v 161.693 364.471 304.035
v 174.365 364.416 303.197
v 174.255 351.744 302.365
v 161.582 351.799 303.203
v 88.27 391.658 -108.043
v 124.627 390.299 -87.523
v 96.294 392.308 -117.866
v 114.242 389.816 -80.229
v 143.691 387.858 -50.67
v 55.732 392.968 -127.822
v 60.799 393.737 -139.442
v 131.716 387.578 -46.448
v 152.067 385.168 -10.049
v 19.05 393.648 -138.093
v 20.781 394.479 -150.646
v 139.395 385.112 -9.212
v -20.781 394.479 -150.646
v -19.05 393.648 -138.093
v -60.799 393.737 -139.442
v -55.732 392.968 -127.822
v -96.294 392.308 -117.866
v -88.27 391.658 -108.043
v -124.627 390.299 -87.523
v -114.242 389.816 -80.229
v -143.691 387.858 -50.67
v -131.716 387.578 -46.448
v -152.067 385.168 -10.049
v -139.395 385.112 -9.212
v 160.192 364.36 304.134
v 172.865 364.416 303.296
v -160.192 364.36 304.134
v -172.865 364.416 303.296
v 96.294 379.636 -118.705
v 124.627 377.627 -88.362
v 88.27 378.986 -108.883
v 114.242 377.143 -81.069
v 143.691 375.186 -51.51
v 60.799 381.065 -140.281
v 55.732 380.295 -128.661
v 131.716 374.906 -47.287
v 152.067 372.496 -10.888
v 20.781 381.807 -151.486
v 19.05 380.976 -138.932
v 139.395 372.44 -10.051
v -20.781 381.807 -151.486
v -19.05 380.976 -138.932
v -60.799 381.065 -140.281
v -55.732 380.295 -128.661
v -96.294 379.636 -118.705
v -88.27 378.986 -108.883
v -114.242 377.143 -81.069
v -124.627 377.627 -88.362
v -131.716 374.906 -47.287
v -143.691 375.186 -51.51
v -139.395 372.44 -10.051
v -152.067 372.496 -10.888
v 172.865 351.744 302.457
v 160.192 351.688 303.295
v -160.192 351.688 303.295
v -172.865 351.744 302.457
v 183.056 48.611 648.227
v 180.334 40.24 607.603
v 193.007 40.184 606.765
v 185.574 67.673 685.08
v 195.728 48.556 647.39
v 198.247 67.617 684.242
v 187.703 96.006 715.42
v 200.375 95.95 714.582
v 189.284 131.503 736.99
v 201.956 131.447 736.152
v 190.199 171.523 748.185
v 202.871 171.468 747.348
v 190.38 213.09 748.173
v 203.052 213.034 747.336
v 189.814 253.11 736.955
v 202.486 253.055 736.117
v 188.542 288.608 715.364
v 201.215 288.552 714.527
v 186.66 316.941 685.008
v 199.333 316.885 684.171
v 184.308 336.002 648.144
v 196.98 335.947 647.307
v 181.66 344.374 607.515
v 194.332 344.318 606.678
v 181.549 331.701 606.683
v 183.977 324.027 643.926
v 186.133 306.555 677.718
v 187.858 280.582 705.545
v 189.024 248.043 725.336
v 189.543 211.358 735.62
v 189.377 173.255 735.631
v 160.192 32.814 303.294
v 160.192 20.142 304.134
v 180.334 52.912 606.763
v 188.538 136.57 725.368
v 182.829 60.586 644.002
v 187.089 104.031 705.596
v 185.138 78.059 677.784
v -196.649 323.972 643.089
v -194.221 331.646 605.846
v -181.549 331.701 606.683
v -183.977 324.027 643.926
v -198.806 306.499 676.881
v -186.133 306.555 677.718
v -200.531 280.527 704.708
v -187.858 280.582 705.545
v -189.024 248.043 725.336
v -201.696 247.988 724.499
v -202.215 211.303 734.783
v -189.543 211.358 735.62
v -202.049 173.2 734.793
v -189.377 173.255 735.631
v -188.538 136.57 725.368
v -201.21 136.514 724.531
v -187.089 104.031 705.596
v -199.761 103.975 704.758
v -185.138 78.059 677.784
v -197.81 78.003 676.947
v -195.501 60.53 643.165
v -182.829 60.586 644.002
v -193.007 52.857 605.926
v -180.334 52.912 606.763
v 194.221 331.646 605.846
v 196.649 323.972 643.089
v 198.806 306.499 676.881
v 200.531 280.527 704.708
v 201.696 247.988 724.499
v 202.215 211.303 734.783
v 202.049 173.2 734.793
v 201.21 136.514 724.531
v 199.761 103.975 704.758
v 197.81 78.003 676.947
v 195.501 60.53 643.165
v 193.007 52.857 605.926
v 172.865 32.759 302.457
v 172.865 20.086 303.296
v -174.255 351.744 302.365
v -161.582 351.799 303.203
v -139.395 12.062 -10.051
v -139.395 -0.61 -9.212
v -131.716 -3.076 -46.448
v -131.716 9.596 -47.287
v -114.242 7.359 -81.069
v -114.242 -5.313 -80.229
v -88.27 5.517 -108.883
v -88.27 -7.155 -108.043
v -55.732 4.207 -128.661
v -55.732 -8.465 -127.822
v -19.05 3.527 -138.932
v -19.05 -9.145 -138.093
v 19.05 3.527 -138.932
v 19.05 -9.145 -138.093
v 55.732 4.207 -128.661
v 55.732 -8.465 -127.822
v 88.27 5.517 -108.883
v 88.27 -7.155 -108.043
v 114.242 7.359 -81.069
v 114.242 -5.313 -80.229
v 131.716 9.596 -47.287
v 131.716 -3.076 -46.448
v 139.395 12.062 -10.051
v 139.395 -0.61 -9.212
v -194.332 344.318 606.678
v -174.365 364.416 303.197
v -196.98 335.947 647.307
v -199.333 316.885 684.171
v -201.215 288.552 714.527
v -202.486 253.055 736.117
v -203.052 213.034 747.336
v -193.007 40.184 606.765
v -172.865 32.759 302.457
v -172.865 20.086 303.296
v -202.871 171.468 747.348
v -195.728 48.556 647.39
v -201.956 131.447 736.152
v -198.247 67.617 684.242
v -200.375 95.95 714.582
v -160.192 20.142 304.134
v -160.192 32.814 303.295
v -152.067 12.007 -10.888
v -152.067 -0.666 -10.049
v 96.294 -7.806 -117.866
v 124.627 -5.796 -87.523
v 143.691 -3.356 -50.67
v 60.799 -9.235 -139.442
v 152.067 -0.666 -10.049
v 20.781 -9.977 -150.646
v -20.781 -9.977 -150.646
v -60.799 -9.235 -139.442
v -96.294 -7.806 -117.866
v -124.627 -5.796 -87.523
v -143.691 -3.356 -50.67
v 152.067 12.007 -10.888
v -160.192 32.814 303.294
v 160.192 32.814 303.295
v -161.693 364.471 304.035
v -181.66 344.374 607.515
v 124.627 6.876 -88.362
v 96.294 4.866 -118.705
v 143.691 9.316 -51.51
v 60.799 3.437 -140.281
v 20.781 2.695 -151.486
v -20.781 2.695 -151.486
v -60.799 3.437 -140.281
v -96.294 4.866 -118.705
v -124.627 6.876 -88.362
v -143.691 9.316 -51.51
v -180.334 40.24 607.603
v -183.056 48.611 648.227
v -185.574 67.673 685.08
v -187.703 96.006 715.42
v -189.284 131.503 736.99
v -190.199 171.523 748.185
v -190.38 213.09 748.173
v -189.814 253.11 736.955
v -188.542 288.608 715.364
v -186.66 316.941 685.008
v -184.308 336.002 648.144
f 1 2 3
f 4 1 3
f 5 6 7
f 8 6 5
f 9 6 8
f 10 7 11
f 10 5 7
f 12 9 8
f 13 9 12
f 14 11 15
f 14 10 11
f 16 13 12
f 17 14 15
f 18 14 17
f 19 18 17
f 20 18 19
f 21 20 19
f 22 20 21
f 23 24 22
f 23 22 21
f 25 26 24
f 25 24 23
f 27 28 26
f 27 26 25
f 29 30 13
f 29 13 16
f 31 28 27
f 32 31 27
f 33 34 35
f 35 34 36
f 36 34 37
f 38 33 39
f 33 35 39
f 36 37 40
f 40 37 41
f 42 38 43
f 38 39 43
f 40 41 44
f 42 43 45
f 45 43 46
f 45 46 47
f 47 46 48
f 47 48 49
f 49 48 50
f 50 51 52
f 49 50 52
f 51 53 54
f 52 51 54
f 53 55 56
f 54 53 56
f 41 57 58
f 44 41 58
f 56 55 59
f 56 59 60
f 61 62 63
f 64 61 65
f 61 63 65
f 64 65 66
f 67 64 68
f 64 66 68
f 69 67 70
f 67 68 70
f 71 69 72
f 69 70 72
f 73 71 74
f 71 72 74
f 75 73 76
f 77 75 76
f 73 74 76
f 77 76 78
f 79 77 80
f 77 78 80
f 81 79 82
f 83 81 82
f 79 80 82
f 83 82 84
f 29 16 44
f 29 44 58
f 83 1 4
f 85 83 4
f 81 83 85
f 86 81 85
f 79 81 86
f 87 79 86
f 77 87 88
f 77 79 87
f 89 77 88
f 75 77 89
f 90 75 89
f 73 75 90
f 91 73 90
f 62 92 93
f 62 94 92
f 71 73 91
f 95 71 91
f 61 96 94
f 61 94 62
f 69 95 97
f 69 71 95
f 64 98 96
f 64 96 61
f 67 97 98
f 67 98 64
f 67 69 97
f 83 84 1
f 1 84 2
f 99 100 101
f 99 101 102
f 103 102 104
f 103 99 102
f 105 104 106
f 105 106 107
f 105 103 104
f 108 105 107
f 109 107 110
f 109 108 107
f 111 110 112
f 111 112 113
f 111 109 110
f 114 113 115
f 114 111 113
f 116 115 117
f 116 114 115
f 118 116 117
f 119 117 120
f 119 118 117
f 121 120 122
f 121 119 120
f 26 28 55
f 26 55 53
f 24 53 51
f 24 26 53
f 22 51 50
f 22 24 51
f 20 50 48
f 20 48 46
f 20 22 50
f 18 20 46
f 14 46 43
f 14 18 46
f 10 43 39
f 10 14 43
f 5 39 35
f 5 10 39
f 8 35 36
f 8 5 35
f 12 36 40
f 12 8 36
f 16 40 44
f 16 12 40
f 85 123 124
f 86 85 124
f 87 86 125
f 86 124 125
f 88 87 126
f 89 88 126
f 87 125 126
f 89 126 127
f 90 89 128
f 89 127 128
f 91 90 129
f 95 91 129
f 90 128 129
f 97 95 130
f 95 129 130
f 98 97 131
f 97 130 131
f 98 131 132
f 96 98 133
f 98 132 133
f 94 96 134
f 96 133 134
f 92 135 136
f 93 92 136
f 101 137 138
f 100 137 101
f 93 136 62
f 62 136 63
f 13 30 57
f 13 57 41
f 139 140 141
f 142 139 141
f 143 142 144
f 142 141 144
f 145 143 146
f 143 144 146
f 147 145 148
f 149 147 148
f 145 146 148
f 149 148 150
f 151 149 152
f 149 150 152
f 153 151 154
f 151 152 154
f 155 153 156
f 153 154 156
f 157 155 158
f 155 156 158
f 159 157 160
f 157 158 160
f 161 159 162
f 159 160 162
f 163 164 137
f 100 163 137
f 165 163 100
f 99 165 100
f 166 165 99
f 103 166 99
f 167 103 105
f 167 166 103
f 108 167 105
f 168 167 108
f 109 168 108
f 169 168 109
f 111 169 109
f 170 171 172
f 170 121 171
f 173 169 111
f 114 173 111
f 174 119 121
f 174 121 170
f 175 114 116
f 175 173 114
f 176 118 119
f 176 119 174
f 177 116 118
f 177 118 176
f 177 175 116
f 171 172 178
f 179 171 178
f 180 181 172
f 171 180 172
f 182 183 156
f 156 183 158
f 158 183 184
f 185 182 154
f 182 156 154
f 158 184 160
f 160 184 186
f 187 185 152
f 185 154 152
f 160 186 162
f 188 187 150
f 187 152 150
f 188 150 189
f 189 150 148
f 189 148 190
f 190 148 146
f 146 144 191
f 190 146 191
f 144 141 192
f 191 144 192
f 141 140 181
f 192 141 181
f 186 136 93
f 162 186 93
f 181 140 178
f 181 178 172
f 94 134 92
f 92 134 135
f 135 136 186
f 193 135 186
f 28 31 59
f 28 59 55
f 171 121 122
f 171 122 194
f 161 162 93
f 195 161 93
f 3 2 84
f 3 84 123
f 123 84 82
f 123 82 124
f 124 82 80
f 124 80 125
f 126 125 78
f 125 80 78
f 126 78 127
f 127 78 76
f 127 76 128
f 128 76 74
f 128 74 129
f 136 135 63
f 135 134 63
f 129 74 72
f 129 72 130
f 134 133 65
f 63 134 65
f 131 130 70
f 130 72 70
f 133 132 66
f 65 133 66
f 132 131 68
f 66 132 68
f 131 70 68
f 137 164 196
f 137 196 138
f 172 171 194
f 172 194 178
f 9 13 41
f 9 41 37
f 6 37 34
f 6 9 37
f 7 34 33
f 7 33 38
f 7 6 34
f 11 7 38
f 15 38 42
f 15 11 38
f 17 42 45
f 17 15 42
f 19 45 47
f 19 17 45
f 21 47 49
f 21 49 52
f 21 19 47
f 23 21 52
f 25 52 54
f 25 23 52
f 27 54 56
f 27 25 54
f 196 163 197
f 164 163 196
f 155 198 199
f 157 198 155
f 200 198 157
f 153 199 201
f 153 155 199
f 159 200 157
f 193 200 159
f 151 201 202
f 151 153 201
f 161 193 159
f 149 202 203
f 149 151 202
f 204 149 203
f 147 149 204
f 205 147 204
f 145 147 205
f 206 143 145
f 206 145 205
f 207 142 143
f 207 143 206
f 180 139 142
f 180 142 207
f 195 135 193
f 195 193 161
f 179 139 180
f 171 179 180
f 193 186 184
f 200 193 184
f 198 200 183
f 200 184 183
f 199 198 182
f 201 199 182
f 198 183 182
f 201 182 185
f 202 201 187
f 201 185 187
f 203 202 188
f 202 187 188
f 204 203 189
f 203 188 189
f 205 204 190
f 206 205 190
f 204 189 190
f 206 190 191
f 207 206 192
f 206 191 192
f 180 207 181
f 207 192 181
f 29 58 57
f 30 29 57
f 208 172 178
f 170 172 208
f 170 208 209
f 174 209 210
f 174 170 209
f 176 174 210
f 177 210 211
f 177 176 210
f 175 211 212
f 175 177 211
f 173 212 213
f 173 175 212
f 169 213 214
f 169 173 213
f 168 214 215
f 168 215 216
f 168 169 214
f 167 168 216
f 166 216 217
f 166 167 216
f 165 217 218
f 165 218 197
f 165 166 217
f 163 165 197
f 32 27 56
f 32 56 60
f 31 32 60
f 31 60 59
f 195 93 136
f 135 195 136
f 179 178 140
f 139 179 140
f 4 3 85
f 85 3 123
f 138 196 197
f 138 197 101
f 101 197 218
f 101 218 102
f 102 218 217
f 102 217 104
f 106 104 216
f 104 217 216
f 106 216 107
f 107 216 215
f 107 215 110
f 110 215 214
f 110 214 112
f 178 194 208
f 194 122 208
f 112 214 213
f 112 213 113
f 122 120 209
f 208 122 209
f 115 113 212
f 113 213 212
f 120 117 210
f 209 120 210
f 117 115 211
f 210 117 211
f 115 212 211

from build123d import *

# Parameters (mm, degrees)
F3_DEPTH = 12.7
F6_DEPTH = 12.7


with BuildPart() as f3:
    # F2 (on line) → F3 (new body)
    with BuildSketch(Plane(origin=(0, 0, 0), x_dir=(-1, 0, 0), z_dir=(0, 0.9978141736, -0.066082335))):
        with BuildLine():
            Line((-172.8647352488, 303.9607363172), (-152.0668657262, -10.0711641936))
            ThreePointArc((-152.0668657262, -10.0711641936), (0, -152.4), (152.0668657262, -10.0711641936))
            Line((152.0668657262, -10.0711641936), (172.8647352488, 303.9607363172))
            Line((172.8647352488, 303.9607363172), (160.1924964383, 304.8))
            Line((160.1924964383, 304.8), (139.3946269157, -9.2319005108))
            ThreePointArc((139.3946269157, -9.2319005108), (0, -139.7), (-139.3946269157, -9.2319005108))
            Line((-139.3946269157, -9.2319005108), (-160.1924964383, 304.8))
            Line((-160.1924964383, 304.8), (-172.8647352488, 303.9607363172))
        make_face()
    extrude(amount=F3_DEPTH)


with BuildPart() as f6:
    # F5 (on face) → F6 (new body)
    with BuildSketch(Plane(origin=(152.0673267986, -0.665513706, -10.0489640396), x_dir=(-0.0043573713, -0.9999904652, 0.0002879453), z_dir=(-0.9978141736, 0.004366875, 0.0659378905))):
        with BuildLine():
            Line((-33.4245076272, 313.197288843), (-20.7521467938, 314.0347080374))
            Line((-20.7521467938, 314.0347080374), (-40.850207461, 618.1713680398))
            ThreePointArc((-40.850207461, 618.1713680398), (-192.9185374622, 760.5223377062), (-344.9868674634, 618.1713680398))
            Line((-344.9868674634, 618.1713680398), (-365.0849281307, 314.0347080374))
            Line((-365.0849281307, 314.0347080374), (-352.4125672972, 313.197288843))
            Line((-352.4125672972, 313.197288843), (-332.31450663, 617.3339488454))
            ThreePointArc((-332.31450663, 617.3339488454), (-192.9185374622, 747.8223377062), (-53.5225682945, 617.3339488454))
            Line((-53.5225682945, 617.3339488454), (-33.4245076272, 313.197288843))
        make_face()
    extrude(amount=F6_DEPTH)


with BuildPart() as f7_1:
    # F7: instance of F6
    add(f6.part.mirror(Plane.YZ))


with BuildPart() as f10_1:
    # F10: instance of F3
    add(f3.part.mirror(Plane(origin=(0, 192.251184308, 0), x_dir=(-1, 0, 0), z_dir=(0, 1, 0))))


solid = Compound([f3.part, f6.part, f7_1.part, f10_1.part])
